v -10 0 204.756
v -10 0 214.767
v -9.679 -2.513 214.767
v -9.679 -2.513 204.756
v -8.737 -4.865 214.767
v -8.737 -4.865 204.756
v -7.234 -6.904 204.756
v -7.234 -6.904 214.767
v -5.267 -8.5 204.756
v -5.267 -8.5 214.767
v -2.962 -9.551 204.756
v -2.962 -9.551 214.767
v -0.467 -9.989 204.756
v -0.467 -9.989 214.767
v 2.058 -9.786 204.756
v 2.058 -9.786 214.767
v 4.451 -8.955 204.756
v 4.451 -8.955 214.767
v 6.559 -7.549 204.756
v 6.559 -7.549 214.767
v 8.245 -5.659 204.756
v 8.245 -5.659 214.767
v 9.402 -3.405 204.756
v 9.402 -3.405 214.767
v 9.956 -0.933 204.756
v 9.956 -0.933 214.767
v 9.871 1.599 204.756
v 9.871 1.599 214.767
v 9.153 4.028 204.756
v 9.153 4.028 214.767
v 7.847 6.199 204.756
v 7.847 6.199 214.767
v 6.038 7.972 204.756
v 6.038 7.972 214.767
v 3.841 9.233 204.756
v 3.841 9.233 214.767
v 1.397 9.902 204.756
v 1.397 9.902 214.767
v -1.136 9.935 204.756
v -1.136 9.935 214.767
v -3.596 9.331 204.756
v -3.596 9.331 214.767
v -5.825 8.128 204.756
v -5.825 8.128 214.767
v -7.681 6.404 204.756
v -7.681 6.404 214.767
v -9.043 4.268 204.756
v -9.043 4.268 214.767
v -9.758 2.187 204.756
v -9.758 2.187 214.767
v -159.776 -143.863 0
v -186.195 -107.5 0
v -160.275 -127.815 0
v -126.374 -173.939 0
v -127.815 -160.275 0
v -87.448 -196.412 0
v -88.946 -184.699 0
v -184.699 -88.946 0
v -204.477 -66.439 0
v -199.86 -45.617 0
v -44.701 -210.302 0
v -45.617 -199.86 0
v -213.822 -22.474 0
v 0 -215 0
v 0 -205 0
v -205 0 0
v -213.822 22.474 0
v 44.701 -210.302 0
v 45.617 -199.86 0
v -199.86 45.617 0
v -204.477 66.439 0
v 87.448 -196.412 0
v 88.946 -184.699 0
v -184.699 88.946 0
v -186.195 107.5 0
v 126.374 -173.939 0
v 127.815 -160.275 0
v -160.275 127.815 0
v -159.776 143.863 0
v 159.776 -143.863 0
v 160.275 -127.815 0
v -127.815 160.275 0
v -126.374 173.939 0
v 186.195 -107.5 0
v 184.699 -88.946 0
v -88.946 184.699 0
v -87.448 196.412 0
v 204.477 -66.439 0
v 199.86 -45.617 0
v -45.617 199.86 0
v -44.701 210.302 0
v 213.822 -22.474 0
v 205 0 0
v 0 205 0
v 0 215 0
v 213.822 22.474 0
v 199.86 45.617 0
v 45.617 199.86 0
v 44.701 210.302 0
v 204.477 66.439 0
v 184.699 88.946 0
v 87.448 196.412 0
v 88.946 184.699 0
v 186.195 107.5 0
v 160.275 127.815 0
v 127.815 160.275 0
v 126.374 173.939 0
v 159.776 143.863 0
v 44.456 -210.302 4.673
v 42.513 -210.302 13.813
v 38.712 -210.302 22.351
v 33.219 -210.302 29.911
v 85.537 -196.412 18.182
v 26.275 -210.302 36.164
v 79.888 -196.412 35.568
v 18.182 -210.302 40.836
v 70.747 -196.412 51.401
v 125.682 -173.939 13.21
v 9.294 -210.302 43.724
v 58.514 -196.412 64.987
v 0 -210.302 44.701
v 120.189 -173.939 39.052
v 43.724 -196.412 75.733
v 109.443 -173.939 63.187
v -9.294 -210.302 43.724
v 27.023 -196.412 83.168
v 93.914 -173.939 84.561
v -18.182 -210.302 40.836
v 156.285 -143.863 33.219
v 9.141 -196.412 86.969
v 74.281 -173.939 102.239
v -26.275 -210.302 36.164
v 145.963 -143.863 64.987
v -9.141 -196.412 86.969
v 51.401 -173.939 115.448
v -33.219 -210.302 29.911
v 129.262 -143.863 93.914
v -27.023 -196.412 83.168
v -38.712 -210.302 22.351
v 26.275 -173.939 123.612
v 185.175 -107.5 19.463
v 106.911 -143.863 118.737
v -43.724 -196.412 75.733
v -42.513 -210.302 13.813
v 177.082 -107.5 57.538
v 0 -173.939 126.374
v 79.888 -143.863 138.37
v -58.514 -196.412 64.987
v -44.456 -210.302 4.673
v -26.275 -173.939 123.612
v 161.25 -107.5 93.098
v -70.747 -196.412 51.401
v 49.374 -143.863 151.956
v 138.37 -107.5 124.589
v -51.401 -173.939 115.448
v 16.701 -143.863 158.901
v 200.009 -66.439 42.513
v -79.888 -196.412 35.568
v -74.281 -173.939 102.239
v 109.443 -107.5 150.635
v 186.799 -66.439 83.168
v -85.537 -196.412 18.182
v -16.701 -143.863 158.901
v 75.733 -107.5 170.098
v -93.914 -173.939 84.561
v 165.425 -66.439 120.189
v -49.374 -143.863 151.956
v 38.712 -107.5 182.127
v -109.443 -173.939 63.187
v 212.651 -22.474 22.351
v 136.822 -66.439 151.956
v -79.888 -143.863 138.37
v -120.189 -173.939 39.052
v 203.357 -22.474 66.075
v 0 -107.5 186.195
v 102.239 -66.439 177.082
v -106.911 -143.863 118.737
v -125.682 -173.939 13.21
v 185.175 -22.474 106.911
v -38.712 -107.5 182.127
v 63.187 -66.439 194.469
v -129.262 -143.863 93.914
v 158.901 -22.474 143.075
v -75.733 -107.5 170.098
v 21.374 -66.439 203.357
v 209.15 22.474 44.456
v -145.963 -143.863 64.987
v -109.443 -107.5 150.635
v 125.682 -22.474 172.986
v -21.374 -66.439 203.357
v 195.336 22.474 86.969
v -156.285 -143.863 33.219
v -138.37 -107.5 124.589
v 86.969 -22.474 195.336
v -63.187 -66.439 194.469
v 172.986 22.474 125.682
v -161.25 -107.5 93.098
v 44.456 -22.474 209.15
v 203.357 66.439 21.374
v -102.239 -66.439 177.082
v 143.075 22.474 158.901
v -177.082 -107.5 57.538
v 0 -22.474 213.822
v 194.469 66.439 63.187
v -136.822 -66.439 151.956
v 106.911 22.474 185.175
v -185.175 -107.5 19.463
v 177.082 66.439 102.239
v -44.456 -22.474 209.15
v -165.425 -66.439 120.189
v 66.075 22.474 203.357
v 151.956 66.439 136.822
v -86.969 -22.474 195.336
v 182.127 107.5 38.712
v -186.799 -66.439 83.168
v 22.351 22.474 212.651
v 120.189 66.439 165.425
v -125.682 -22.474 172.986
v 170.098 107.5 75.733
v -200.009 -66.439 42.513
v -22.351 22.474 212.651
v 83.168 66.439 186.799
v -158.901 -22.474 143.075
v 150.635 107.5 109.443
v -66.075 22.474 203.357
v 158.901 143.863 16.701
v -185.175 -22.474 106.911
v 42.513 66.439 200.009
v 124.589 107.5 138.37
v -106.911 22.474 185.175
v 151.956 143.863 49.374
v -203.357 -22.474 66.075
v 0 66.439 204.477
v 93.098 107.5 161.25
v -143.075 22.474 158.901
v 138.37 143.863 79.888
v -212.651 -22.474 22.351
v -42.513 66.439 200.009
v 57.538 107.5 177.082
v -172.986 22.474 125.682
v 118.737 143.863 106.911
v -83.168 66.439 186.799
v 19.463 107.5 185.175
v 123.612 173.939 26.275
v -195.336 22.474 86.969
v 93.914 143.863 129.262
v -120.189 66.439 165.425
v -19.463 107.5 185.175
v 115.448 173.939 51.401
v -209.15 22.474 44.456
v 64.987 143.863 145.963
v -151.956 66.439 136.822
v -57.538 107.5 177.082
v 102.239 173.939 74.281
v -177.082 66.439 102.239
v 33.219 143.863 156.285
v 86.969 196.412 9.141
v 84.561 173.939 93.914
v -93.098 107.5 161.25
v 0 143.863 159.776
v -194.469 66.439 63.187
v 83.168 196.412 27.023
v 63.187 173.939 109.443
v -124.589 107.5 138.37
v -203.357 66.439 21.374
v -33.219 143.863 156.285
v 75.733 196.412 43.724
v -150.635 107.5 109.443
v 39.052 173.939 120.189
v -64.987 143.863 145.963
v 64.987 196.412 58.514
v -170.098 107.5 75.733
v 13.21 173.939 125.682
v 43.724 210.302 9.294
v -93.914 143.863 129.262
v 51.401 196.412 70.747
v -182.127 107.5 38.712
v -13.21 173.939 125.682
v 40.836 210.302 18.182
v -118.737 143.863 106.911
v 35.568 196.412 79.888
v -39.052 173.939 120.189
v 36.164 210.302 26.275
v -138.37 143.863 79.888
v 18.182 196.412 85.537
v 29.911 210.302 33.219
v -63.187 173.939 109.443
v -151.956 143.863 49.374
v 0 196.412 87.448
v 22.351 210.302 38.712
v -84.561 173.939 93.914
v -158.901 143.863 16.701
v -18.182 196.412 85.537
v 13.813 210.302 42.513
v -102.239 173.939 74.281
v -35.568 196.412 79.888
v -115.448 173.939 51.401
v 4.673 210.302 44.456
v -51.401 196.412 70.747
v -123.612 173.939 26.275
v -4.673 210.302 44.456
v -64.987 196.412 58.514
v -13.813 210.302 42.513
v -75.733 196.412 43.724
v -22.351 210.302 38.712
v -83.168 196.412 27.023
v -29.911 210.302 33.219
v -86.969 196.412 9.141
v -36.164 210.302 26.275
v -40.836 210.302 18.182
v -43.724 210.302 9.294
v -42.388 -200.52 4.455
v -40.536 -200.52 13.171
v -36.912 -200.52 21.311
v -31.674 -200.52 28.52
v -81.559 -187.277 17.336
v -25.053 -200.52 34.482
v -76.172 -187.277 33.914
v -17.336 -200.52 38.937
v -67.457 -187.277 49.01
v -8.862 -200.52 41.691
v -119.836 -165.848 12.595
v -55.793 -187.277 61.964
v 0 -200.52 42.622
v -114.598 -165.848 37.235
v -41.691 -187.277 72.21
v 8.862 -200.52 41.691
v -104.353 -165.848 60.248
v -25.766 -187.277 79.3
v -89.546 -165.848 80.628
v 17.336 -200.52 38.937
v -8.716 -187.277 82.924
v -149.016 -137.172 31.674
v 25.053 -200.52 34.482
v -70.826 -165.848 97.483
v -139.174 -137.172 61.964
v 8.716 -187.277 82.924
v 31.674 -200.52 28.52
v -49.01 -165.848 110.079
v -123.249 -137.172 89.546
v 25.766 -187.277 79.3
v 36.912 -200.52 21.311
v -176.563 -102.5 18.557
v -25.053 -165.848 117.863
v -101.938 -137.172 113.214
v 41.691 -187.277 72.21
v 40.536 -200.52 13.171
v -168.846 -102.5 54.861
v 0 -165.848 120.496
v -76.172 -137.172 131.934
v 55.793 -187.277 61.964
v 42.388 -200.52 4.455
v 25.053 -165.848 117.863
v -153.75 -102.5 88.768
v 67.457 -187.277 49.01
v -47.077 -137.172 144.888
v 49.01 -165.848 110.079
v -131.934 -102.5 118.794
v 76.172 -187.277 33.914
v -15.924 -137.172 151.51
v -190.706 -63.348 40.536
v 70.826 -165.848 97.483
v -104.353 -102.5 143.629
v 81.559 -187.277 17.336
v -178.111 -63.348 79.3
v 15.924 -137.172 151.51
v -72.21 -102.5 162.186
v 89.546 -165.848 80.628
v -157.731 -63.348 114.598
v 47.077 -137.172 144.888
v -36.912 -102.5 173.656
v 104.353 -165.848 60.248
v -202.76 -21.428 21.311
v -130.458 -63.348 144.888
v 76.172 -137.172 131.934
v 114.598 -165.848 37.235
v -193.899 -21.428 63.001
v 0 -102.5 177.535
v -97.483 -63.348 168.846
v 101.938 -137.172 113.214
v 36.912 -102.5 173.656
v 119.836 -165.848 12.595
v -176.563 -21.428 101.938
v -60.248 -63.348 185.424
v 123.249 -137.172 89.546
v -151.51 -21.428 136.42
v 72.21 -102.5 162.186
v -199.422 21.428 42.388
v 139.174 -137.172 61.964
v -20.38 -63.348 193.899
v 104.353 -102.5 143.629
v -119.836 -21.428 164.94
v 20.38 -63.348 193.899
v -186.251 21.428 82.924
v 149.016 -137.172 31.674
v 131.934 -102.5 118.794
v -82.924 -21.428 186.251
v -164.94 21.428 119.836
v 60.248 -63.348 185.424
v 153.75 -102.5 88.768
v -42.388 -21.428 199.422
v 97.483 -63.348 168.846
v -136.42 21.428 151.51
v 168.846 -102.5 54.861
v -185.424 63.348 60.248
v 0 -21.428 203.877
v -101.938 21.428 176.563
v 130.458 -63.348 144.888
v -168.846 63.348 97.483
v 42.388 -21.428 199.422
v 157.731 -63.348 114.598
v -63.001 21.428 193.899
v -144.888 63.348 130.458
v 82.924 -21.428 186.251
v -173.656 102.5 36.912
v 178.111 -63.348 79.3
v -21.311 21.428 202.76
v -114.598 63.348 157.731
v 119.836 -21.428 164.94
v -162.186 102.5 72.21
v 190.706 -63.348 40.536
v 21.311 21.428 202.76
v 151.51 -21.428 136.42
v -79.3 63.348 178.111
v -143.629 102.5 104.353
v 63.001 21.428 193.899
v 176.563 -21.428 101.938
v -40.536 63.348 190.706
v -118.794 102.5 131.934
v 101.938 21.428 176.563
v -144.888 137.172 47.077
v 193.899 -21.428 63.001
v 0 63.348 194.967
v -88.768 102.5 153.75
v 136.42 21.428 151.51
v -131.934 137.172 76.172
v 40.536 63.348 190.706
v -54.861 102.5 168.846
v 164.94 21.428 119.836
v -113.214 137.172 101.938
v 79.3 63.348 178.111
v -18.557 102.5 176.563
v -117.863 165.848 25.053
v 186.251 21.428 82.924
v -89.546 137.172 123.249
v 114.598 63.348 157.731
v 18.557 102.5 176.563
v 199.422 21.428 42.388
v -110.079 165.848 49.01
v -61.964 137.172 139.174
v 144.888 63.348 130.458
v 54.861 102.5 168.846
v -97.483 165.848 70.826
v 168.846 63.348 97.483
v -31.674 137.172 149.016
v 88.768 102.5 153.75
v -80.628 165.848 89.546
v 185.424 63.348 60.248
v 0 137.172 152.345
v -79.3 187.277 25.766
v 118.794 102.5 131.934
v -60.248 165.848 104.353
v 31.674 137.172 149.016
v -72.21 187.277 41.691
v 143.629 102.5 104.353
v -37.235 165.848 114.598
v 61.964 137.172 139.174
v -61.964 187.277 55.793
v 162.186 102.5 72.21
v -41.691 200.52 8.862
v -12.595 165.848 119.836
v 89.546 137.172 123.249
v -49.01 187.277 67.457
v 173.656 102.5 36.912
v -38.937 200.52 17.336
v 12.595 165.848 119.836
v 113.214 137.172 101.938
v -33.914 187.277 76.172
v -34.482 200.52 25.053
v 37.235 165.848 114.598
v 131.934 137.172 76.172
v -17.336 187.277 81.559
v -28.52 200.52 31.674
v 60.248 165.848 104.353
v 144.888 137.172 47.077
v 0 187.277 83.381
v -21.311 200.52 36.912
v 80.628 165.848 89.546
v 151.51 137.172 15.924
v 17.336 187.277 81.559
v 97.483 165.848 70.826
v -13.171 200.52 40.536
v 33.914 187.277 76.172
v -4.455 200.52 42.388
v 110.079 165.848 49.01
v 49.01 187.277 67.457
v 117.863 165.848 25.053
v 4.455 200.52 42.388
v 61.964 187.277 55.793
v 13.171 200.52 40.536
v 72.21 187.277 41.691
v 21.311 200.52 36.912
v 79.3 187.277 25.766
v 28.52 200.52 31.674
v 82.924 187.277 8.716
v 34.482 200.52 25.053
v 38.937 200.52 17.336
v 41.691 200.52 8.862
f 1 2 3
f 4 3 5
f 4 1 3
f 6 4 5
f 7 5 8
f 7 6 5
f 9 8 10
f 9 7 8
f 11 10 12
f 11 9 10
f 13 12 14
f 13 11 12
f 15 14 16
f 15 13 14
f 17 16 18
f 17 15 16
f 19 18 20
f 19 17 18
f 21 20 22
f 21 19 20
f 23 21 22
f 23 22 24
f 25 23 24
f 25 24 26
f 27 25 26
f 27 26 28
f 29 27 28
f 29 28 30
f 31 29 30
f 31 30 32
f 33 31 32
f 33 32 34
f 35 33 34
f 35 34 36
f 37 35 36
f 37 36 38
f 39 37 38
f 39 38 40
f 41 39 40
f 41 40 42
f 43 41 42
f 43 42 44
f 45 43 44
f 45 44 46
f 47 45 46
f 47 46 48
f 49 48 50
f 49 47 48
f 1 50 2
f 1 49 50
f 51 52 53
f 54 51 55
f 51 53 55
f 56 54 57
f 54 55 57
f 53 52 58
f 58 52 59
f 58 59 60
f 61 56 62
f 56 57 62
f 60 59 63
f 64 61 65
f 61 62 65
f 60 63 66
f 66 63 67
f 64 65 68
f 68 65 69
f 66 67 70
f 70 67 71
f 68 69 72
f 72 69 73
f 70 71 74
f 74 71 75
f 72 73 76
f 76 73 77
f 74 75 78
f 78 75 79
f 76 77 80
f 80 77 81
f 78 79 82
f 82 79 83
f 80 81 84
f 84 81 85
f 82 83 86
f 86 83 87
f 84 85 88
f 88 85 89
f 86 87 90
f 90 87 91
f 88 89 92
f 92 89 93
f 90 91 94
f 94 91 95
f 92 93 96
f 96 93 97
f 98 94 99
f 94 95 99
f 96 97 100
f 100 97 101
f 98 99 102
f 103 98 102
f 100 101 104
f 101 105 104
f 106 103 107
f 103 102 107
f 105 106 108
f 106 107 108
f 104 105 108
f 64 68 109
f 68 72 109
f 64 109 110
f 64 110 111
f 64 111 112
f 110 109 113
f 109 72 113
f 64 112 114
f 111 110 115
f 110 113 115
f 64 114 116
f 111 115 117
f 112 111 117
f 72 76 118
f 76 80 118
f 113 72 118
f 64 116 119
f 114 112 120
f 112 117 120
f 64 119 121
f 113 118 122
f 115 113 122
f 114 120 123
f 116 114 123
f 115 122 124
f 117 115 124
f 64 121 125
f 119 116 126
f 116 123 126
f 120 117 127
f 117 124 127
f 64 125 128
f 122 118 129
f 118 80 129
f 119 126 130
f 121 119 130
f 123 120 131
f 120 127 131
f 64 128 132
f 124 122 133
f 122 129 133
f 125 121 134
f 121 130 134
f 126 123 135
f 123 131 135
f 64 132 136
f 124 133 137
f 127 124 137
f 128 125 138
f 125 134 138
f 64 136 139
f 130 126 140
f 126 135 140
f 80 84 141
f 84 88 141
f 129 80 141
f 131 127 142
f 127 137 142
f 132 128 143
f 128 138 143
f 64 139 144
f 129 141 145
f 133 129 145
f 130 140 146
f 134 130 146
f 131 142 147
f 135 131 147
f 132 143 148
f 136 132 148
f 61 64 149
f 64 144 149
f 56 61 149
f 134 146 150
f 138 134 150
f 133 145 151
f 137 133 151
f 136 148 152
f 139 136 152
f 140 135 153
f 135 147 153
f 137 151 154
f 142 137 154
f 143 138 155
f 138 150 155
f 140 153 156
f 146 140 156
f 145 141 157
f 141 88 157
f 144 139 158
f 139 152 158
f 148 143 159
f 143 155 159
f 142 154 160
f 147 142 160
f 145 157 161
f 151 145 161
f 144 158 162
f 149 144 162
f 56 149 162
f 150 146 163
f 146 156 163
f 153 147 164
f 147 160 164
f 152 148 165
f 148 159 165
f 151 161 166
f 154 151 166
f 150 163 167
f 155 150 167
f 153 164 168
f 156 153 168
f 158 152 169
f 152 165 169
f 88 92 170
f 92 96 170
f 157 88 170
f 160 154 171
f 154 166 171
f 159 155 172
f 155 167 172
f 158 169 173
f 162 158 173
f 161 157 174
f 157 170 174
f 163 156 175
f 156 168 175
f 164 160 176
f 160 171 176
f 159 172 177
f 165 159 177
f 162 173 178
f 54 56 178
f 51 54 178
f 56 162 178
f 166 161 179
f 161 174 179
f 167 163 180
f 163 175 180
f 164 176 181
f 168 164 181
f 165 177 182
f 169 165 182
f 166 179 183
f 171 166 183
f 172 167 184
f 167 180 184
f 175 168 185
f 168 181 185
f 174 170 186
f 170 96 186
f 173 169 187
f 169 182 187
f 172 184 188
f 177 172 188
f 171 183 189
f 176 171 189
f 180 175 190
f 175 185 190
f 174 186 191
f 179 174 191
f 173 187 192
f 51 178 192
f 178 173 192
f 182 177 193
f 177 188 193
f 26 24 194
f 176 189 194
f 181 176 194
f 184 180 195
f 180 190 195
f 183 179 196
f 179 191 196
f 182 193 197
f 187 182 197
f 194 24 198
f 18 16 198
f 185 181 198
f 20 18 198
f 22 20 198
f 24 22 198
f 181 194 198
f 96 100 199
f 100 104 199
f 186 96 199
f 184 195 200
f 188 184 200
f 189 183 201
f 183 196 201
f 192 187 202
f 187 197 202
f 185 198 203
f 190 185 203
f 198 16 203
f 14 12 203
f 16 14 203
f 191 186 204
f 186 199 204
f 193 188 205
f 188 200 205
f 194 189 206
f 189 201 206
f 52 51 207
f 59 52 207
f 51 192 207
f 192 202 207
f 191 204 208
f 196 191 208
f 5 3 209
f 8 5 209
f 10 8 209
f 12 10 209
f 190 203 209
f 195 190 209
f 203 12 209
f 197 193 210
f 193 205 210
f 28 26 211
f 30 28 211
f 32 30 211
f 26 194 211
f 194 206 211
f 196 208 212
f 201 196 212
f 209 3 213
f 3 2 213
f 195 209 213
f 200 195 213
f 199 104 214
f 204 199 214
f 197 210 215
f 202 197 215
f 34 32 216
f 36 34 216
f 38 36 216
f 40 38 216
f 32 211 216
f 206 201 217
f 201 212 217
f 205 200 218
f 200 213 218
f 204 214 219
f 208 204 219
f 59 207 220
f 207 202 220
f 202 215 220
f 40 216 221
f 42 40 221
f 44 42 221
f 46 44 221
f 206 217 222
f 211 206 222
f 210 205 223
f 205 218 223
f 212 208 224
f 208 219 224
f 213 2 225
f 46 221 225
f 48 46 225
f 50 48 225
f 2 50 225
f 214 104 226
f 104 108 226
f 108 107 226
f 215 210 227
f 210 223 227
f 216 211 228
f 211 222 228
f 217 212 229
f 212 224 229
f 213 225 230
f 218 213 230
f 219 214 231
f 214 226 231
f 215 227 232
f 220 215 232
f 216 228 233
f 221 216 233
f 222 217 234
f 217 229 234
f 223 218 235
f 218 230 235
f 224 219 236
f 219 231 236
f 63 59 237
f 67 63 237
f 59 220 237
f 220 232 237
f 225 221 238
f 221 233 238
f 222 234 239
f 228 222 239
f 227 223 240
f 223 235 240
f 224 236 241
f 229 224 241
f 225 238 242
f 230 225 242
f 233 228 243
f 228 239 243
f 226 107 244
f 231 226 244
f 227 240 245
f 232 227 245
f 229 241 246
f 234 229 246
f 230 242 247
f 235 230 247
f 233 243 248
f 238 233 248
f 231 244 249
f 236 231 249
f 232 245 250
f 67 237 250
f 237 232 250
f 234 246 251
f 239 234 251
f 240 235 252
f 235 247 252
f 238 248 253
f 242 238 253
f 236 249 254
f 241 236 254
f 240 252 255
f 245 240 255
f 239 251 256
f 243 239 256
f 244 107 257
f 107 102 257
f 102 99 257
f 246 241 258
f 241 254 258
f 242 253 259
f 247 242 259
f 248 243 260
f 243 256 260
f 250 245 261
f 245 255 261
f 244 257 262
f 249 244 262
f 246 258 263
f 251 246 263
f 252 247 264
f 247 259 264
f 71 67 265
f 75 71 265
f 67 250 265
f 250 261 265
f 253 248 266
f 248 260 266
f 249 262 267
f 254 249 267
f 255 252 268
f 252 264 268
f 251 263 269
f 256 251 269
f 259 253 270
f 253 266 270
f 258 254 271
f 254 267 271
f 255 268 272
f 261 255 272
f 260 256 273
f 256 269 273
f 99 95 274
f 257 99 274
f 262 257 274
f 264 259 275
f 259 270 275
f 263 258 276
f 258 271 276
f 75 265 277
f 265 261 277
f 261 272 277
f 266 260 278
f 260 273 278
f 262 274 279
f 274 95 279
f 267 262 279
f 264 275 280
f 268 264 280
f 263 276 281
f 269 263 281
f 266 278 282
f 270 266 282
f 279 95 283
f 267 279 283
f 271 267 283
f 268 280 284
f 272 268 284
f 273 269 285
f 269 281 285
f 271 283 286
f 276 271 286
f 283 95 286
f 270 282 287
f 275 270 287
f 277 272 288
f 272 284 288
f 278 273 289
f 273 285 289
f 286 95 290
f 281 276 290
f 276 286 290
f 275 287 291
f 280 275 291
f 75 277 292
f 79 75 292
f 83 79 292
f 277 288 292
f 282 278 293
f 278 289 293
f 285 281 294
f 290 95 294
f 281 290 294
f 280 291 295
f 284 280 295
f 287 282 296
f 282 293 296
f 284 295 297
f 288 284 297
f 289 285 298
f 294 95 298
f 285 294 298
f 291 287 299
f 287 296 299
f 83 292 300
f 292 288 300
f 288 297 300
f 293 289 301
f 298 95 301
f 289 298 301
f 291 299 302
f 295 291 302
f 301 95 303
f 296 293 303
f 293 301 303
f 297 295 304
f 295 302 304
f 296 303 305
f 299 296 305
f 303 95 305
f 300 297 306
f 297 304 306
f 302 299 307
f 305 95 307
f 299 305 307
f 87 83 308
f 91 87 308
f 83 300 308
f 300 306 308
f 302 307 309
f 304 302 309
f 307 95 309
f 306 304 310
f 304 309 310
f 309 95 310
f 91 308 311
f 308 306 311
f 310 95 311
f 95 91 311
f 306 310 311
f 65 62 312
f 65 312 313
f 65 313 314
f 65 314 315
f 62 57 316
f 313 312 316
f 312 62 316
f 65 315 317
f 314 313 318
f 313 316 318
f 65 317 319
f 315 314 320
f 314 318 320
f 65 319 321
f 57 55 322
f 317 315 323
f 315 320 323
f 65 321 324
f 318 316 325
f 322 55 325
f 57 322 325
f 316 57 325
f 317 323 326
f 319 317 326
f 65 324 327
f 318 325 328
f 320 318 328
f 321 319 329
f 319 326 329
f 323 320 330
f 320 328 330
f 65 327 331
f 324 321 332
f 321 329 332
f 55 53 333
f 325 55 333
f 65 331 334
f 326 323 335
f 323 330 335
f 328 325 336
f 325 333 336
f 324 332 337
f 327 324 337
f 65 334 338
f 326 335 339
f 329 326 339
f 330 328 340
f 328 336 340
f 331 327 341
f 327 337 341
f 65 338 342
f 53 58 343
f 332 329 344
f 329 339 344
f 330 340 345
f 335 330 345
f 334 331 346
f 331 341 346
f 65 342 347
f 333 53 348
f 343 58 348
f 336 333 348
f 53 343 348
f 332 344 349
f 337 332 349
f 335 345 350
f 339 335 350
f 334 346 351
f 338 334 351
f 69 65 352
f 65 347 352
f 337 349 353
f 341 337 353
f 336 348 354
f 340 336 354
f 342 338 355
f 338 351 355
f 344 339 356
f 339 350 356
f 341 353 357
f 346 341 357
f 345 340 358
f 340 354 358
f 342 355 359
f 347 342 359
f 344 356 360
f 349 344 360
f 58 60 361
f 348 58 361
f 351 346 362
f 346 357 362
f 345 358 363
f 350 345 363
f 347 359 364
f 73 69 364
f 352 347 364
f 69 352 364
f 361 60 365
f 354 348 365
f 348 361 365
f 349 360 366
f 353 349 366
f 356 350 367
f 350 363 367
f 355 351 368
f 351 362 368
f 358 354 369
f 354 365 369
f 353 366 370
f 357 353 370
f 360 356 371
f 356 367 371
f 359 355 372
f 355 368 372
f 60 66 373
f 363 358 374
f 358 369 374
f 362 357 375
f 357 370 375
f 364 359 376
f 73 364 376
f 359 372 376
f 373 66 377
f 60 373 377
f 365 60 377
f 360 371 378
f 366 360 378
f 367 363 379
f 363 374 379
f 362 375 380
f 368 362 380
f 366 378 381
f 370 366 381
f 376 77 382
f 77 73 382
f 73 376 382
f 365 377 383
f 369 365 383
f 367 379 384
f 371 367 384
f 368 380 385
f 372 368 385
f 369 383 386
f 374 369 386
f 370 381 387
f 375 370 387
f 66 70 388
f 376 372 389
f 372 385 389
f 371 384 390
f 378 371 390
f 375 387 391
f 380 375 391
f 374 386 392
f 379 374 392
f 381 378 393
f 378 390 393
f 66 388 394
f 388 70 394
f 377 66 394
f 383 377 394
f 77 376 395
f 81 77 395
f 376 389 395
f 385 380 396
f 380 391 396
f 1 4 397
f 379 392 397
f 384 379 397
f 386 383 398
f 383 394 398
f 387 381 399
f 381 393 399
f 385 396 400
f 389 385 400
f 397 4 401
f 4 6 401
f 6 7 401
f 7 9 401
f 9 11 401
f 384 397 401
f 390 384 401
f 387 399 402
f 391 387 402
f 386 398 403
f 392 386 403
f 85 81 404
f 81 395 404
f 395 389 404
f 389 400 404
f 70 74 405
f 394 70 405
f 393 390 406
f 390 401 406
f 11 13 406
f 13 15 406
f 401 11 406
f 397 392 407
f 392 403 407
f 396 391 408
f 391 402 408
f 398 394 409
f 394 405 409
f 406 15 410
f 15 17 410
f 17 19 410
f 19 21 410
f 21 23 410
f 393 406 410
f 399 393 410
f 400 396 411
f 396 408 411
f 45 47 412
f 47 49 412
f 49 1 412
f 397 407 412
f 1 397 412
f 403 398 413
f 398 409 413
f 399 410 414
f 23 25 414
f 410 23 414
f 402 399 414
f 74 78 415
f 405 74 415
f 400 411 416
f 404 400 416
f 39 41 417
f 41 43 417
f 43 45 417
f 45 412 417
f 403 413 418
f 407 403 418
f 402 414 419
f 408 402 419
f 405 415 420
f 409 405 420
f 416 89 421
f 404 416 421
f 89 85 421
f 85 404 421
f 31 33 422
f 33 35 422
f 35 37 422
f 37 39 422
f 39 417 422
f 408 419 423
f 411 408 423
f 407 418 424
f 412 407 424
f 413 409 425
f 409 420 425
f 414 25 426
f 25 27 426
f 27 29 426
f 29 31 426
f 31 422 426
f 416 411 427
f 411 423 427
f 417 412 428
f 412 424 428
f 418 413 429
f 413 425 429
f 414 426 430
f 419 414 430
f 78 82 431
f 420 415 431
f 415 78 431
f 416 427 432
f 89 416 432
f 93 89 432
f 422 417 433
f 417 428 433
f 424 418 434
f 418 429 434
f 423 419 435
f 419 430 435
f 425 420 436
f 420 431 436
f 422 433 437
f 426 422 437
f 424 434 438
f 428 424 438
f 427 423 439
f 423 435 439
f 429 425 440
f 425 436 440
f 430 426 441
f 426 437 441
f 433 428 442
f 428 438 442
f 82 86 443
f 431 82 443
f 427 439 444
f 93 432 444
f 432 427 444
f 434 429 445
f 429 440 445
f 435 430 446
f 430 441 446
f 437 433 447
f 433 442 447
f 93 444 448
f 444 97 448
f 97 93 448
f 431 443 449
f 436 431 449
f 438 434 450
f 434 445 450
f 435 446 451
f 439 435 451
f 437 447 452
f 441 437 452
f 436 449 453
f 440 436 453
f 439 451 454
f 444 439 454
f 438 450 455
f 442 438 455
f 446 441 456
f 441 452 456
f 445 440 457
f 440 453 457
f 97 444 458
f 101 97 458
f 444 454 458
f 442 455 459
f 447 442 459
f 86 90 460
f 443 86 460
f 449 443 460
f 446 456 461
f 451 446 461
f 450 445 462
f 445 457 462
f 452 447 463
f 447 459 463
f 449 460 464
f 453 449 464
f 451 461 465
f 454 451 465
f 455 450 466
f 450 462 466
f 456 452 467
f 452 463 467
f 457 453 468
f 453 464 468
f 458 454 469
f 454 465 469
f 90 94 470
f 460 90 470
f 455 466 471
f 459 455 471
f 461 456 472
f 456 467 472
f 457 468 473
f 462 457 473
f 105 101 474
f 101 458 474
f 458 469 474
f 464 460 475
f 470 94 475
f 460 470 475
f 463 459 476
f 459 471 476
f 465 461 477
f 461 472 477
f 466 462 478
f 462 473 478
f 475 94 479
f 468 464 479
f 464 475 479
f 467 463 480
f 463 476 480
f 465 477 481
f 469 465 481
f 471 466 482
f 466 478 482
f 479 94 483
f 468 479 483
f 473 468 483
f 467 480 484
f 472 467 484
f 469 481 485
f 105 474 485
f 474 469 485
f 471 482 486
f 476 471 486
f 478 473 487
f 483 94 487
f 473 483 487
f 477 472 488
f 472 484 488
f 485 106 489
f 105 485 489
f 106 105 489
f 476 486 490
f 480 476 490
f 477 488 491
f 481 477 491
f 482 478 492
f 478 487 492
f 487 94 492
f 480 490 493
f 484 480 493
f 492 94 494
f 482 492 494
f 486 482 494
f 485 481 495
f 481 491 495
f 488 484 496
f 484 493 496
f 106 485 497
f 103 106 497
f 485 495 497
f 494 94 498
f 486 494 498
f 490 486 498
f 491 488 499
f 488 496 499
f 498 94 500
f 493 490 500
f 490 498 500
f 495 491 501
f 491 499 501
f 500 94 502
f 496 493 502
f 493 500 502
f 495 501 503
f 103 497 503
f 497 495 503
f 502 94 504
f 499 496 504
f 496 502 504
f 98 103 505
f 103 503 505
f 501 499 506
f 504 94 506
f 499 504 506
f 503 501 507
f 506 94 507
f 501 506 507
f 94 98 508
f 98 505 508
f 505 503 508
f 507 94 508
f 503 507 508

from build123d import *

# Parameters (mm, degrees)
REVOLVE1_ANGLE     = 180
CUT_REVOLVE1_ANGLE = 180
SKETCH3_R          = 10
CUT_EXTRUDE1_DEPTH = 362


with BuildPart() as part:
    # Sketch1 → Revolve1 (revolve)
    with BuildSketch(Plane.XY):
        with BuildLine():
            Line((0, 215), (0, -215))
            ThreePointArc((0, -215), (215, 0), (0, 215))
        make_face()
    revolve(axis=Axis((0, 215, 0), (0, -1, 0)), revolution_arc=REVOLVE1_ANGLE)

    # Sketch2 → Cut-Revolve1 (revolve, cut)
    with BuildSketch(Plane(origin=(0, 0, 0), x_dir=(-1, 0, 0), z_dir=(0, 0, -1))):
        with BuildLine():
            Line((0, 205), (0, -205))
            ThreePointArc((0, -205), (205, 0), (0, 205))
        make_face()
    revolve(axis=Axis((0, 205, 0), (0, 1, 0)), revolution_arc=CUT_REVOLVE1_ANGLE, mode=Mode.SUBTRACT)

    # Sketch3 → Cut-Extrude1 (cut)
    with BuildSketch(Plane.XY):
        with Locations(Location((0, 0, 0), (0, 0, 180))):
            Circle(SKETCH3_R)
    extrude(amount=CUT_EXTRUDE1_DEPTH, mode=Mode.SUBTRACT)


solid = part.part
